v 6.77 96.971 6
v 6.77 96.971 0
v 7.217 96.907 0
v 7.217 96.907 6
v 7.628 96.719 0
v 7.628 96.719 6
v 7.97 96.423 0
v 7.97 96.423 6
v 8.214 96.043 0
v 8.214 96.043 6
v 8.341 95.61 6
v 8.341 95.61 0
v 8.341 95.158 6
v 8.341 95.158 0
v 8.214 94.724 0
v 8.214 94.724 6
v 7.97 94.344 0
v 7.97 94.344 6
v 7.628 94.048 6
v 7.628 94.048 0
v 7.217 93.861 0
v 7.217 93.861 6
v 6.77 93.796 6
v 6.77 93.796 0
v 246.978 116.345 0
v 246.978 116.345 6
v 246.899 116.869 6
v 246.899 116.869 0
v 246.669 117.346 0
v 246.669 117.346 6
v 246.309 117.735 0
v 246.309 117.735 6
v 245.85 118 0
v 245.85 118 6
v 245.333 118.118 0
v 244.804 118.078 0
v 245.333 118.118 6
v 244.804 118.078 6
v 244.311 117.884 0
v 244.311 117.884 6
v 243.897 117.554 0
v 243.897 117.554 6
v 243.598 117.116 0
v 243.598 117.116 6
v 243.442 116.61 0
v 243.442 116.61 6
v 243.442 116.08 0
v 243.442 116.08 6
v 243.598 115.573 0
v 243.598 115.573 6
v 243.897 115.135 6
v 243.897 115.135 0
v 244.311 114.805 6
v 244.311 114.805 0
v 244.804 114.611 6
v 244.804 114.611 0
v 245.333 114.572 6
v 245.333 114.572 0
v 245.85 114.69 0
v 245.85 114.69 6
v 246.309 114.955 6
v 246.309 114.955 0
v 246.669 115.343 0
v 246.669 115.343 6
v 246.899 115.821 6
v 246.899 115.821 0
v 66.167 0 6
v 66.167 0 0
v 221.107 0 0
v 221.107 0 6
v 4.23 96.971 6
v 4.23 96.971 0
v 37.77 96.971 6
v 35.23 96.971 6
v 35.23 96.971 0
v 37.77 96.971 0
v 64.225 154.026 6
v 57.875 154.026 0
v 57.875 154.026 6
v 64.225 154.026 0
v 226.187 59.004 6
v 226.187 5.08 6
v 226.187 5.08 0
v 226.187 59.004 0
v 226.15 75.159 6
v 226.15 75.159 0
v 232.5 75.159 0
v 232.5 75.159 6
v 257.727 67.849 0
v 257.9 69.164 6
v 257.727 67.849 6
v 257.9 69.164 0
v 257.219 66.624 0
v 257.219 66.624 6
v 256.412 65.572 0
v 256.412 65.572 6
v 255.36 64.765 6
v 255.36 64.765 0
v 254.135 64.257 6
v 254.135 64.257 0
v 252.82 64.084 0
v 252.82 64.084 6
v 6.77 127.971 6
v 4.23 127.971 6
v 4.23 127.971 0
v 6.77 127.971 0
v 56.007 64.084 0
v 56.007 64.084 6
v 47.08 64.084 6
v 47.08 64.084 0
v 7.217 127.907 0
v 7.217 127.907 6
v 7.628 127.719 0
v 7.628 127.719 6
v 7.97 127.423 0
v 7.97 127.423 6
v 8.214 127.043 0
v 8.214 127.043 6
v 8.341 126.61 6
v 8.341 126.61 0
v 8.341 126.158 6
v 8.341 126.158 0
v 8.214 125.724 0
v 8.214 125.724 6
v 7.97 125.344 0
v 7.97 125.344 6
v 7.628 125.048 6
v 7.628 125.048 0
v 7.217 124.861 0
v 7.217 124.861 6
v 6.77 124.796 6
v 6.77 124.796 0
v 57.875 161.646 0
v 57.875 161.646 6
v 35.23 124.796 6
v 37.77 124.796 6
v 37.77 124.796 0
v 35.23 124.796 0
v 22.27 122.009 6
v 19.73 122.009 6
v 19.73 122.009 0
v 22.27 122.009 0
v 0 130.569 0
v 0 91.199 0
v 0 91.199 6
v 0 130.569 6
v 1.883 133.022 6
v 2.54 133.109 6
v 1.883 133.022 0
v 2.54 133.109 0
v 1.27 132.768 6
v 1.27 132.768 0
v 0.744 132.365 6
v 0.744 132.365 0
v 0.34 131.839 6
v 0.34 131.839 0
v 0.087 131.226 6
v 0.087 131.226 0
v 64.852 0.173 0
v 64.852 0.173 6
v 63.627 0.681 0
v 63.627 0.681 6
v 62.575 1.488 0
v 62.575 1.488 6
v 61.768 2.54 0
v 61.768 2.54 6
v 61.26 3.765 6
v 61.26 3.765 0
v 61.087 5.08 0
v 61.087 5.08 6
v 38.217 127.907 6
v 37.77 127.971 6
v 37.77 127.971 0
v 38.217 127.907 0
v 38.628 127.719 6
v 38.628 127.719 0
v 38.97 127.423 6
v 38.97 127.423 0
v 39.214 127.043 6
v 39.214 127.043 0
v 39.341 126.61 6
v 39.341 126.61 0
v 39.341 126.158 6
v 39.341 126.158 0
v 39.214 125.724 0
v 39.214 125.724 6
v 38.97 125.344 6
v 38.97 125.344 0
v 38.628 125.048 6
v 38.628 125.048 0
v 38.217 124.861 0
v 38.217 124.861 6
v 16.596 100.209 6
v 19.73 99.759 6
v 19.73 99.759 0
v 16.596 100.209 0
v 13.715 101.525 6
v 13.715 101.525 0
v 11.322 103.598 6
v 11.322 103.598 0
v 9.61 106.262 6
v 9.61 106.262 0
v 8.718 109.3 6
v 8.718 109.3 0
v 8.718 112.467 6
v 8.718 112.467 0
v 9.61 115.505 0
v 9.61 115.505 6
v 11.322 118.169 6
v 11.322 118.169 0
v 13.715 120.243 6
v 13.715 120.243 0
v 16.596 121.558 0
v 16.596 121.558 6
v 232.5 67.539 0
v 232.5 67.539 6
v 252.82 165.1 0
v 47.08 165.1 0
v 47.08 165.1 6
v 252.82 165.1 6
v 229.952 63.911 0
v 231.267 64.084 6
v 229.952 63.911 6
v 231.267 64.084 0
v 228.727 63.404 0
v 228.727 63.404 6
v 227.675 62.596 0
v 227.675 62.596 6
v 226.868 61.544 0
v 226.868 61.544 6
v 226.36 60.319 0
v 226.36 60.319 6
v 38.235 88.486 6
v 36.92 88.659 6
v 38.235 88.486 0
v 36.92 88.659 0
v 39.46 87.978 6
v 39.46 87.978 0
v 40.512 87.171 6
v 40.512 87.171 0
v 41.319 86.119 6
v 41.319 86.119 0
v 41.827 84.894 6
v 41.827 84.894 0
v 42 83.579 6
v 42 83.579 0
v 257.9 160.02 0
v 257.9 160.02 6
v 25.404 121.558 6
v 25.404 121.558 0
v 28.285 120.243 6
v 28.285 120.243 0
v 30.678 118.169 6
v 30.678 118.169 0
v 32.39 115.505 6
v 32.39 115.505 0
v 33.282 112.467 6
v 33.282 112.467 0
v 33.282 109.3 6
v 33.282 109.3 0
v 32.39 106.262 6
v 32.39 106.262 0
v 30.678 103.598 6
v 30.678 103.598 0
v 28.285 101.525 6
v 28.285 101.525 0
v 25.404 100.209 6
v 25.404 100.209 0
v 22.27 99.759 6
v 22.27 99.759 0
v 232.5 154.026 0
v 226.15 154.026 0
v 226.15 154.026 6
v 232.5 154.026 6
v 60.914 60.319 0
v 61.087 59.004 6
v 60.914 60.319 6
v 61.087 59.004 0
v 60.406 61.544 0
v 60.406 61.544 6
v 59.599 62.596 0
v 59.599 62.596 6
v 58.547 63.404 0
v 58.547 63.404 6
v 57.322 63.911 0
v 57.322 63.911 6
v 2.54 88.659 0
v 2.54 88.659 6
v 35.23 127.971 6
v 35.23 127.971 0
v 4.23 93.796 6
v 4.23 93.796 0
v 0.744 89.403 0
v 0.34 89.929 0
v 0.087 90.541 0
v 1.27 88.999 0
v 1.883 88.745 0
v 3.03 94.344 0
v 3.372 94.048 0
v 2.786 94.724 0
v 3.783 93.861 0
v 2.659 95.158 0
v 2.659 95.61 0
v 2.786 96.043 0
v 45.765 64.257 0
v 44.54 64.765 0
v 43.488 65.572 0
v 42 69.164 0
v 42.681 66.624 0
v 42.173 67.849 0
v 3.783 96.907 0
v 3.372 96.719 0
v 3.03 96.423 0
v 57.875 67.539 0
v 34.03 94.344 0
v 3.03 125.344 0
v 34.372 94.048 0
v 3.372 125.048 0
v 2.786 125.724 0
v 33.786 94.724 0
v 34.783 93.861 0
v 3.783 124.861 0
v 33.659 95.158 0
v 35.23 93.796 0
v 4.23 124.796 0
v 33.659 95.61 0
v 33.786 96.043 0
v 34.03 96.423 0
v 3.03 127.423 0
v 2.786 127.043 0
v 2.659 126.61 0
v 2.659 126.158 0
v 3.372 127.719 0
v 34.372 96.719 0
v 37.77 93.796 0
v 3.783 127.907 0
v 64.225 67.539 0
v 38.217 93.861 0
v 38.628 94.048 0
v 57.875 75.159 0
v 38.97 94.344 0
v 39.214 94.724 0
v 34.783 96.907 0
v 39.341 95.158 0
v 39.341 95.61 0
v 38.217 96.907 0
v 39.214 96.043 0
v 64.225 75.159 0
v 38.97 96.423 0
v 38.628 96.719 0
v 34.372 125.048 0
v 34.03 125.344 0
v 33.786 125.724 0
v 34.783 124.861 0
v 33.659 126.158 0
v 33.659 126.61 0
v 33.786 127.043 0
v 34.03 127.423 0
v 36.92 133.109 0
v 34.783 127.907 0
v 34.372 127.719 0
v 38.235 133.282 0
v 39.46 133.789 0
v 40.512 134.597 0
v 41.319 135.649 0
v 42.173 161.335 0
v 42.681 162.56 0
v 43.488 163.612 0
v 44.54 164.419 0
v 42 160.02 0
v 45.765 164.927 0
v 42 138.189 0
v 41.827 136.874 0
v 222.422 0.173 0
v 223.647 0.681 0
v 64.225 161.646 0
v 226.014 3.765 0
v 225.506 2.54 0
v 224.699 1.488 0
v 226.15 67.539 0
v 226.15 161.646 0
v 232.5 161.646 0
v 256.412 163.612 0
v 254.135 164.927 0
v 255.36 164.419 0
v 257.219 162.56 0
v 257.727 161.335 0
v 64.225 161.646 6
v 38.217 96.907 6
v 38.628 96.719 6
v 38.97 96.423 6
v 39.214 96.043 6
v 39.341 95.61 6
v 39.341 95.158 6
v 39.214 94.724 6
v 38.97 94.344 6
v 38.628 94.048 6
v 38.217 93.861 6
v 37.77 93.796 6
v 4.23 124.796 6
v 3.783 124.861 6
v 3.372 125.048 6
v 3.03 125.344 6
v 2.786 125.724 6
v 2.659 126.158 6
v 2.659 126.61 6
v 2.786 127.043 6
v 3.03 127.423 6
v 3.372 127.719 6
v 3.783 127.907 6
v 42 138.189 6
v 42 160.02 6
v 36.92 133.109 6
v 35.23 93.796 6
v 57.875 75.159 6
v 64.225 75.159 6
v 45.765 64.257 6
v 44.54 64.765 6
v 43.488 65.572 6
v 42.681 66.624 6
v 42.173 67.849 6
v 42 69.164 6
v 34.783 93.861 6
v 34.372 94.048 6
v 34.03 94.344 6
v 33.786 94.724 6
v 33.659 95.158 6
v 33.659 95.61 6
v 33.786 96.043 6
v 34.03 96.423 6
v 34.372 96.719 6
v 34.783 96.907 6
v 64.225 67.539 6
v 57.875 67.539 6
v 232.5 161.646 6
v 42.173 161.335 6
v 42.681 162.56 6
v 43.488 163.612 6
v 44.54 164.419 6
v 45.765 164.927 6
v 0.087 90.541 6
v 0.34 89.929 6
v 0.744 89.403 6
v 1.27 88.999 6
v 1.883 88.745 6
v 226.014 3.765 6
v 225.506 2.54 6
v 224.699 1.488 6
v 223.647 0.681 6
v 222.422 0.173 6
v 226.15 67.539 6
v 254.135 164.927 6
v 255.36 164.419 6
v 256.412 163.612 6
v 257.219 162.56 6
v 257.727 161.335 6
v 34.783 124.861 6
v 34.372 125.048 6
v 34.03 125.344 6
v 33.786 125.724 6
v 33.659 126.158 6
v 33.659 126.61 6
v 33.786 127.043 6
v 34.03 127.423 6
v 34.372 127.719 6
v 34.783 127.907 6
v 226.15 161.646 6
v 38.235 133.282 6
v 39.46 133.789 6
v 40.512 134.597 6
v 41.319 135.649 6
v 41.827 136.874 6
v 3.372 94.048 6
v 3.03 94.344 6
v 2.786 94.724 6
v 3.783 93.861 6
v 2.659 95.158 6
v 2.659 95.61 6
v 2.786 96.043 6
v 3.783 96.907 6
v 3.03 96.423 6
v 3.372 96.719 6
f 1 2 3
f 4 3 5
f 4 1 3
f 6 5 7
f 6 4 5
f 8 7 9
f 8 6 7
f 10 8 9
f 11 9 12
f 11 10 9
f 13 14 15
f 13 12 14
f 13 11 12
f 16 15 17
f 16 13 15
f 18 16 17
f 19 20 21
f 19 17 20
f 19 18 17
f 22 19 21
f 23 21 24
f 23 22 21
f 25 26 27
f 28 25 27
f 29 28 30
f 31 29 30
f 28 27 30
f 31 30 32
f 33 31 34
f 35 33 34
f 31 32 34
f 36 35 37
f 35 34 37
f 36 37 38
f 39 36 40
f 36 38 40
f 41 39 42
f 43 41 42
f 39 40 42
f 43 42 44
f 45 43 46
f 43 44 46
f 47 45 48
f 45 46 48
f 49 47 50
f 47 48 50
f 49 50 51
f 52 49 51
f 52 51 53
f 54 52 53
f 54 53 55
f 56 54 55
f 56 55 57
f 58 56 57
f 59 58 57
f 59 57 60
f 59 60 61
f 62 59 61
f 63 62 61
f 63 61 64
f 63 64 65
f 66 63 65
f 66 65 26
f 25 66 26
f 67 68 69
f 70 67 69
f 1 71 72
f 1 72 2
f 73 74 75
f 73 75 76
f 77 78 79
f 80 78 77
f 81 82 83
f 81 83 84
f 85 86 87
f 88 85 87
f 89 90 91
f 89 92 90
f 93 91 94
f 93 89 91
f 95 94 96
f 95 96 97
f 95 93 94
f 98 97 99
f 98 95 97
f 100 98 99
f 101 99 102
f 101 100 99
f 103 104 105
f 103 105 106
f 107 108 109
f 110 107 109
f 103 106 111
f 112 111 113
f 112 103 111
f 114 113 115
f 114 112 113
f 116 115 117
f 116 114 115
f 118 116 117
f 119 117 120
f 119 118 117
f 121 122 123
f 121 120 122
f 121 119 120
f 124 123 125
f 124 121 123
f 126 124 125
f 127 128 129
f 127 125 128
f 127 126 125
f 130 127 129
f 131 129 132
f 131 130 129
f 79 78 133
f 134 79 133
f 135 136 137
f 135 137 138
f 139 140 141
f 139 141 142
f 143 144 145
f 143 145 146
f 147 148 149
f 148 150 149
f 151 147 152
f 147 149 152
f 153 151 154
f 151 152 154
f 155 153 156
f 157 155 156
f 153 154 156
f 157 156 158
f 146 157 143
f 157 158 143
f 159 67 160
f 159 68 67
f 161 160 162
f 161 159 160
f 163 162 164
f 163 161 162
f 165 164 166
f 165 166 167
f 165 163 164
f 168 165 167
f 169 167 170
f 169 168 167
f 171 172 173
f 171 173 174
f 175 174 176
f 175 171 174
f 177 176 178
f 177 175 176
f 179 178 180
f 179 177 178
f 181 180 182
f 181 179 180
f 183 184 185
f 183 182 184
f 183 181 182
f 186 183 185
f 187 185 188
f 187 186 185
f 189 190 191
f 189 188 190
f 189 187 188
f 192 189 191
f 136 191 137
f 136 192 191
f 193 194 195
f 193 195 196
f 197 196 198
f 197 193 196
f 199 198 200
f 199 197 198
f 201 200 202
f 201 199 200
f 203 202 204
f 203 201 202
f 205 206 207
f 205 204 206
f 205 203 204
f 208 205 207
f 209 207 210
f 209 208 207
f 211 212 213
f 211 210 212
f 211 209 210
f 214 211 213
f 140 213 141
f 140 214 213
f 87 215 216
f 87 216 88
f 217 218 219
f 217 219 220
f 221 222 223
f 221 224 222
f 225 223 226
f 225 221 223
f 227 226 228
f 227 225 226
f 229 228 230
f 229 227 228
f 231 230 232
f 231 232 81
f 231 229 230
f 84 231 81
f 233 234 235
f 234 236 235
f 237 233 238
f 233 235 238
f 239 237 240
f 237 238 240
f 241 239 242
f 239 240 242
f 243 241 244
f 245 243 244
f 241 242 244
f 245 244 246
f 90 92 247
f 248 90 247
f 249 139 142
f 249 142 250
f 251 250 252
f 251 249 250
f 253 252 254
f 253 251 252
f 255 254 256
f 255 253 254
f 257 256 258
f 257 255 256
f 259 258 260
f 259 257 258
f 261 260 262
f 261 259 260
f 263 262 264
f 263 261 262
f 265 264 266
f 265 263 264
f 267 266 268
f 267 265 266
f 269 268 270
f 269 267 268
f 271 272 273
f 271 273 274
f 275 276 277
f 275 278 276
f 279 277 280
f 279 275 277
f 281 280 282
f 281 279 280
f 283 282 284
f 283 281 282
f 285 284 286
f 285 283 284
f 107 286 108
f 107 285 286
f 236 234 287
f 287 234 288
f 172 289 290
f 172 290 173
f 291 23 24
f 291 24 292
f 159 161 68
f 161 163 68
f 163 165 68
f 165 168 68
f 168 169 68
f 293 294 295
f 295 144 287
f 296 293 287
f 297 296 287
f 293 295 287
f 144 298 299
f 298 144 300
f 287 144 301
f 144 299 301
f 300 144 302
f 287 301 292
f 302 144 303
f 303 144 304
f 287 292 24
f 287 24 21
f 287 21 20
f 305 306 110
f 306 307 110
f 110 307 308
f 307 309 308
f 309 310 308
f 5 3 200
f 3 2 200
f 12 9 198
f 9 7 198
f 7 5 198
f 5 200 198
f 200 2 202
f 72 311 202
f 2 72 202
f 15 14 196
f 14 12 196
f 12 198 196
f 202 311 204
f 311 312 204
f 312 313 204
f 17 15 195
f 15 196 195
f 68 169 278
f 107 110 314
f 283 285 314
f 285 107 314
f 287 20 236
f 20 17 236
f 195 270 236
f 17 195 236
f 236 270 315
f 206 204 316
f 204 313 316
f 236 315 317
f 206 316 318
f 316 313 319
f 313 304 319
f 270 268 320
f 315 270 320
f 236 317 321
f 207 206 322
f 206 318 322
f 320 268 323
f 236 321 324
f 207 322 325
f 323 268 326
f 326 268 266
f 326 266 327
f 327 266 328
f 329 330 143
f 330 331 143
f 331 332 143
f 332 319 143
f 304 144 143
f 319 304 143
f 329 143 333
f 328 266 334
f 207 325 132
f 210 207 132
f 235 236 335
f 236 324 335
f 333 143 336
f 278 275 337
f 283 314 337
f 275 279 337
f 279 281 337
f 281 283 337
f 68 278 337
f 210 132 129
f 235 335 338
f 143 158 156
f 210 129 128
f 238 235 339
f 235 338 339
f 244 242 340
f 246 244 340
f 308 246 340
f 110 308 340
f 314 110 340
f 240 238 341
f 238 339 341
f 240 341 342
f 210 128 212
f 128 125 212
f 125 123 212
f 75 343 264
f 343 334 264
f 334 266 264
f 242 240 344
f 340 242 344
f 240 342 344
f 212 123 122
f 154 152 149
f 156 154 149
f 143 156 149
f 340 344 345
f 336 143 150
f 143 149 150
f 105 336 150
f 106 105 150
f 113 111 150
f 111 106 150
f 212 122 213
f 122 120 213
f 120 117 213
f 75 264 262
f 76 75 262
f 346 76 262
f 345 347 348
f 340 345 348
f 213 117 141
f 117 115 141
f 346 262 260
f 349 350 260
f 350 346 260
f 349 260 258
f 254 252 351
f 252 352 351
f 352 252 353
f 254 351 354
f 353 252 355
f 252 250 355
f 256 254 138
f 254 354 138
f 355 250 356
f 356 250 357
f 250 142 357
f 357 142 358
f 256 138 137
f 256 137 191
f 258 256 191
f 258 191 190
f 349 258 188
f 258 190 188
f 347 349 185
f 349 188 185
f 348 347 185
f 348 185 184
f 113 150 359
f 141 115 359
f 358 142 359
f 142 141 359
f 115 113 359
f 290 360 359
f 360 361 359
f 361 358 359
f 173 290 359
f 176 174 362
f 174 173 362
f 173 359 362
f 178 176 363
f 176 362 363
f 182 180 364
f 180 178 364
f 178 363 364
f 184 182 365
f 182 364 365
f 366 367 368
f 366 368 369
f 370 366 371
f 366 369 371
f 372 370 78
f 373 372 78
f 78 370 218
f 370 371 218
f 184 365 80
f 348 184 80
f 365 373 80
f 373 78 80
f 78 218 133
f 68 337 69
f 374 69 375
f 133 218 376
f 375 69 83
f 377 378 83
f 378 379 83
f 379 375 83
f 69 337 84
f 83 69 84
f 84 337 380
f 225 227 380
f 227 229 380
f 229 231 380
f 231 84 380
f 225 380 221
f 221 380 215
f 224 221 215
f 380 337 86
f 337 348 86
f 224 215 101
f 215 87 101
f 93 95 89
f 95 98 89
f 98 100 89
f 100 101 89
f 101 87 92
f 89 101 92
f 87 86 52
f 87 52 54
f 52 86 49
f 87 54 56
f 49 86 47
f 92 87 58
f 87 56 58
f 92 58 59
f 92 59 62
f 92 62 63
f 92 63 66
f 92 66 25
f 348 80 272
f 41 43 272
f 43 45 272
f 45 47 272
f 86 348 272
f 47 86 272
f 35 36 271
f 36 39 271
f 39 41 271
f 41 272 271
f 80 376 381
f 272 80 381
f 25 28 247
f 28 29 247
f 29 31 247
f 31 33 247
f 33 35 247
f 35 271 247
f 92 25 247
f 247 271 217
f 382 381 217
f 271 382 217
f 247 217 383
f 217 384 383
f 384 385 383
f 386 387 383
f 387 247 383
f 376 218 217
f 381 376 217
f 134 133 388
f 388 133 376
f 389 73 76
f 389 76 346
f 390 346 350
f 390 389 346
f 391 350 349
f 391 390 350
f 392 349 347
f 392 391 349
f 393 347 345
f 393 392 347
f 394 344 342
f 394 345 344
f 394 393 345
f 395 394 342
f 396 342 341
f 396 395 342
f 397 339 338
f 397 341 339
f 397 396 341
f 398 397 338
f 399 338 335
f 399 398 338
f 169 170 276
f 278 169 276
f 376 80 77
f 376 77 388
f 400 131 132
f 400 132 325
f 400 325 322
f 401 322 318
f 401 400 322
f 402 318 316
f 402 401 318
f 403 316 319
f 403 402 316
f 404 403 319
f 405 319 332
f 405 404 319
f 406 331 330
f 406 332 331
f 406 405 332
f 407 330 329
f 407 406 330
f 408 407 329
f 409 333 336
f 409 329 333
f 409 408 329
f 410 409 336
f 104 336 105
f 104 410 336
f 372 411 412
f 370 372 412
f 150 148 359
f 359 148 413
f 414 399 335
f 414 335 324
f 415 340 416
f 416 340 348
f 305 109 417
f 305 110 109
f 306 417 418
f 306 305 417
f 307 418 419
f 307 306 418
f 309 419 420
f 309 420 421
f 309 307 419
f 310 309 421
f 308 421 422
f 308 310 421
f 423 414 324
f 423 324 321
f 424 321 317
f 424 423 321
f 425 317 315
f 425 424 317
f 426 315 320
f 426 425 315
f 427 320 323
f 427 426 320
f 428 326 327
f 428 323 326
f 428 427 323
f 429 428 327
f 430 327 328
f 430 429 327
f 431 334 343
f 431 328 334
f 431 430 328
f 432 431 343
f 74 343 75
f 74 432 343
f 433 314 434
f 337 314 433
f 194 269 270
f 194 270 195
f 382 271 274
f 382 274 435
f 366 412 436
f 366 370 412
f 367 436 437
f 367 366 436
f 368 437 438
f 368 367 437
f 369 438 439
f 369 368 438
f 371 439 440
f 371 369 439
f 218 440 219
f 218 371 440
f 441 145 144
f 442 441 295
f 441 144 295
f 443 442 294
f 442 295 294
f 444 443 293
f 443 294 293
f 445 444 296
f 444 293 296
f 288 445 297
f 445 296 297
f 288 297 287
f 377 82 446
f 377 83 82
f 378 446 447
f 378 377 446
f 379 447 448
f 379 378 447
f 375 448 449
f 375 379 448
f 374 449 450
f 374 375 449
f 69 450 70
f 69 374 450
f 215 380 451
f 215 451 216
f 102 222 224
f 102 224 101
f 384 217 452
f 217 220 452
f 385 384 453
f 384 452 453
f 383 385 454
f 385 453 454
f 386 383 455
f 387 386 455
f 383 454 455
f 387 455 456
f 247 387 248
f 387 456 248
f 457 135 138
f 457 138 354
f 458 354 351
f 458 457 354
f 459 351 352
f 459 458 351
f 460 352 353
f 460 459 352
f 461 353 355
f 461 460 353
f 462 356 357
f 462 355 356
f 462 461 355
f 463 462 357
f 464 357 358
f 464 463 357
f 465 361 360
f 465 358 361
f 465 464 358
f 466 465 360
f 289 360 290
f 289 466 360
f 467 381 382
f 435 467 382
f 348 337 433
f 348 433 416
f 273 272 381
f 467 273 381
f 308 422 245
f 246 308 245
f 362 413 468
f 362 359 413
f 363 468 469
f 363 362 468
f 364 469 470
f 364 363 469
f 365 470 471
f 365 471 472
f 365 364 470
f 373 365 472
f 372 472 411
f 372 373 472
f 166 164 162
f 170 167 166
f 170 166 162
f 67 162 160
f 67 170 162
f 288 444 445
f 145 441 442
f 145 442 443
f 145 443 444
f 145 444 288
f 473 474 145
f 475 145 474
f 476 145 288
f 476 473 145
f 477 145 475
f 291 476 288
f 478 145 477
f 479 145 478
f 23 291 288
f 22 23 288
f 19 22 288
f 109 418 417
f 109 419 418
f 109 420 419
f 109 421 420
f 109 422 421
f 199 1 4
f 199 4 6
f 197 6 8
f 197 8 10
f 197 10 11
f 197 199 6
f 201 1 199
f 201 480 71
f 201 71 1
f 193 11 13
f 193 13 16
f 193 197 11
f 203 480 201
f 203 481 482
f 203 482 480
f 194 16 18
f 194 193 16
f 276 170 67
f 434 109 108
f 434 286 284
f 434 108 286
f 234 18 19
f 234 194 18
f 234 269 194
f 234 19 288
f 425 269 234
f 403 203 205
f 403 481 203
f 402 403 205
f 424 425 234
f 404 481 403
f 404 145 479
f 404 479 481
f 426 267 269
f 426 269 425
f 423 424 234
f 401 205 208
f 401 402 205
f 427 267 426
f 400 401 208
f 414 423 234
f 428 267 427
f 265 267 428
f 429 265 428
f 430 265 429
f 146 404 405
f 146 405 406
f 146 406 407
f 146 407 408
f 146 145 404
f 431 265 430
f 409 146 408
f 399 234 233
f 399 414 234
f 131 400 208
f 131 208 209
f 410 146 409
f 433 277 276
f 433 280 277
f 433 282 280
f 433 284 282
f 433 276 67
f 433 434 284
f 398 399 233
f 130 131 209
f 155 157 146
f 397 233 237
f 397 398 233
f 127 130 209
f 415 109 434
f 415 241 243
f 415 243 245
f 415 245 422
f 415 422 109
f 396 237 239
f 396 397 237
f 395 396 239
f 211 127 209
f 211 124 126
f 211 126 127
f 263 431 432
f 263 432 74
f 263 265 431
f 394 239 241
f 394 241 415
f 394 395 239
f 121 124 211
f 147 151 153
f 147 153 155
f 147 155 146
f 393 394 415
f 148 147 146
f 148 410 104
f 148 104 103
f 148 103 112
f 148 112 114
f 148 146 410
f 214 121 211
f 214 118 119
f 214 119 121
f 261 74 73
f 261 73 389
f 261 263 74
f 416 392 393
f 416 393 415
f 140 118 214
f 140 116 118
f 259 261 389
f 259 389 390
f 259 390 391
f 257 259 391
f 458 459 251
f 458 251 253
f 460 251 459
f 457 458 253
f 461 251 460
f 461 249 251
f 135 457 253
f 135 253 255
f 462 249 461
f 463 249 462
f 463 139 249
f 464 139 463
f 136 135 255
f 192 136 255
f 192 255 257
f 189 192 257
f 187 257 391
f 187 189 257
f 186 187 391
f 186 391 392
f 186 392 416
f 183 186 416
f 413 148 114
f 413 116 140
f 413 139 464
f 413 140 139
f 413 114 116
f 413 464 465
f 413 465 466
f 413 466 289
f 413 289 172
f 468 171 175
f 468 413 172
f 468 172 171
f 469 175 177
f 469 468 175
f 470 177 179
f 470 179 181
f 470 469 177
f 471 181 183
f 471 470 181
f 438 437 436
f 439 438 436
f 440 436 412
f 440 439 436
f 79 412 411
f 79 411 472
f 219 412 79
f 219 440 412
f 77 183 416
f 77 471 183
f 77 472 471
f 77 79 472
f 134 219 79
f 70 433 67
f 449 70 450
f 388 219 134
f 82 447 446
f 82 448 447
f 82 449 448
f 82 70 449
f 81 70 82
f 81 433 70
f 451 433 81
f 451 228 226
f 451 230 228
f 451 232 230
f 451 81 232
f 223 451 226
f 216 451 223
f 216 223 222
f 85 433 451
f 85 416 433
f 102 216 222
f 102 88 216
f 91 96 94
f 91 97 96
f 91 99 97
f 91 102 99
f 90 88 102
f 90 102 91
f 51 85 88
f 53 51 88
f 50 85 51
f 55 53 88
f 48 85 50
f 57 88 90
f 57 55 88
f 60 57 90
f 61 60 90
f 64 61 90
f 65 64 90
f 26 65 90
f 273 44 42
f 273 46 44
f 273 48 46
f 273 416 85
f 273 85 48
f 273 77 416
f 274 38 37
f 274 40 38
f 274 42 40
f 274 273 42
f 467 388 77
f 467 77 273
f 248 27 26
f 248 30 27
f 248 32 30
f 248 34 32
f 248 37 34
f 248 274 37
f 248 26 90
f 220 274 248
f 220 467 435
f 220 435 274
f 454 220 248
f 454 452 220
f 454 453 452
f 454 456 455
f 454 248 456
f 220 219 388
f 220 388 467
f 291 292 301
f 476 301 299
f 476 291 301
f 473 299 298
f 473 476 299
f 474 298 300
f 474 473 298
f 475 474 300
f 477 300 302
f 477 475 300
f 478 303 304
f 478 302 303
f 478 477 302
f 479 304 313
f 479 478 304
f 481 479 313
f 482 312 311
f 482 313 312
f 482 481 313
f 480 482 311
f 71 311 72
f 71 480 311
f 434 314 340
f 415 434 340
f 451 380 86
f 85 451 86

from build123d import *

# Parameters (mm, degrees)
SKETCH1_W           = 257.9
SKETCH1_H           = 165.1
SKETCH1_W_2         = 6.35
SKETCH1_H_2         = 7.62
BOSS_EXTRUDE1_DEPTH = 6
SKETCH2_R           = 1.778
CUT_EXTRUDE1_DEPTH  = 307.278337464
SKETCH3_W           = 42
SKETCH3_H           = 31.9913
SKETCH3_W_2         = 31.713
SKETCH3_H_2         = 64.0842
CUT_EXTRUDE2_DEPTH  = 307.278337464
FILLET1_R           = 5.08
FILLET2_R           = 2.54


with BuildPart() as part:
    # Sketch1 → Boss-Extrude1 (new body)
    with BuildSketch(Plane.XY):
        with Locations((128.95, 82.55)):
            Rectangle(SKETCH1_W, SKETCH1_H)
        with Locations((229.325, 157.8356)):
            Rectangle(SKETCH1_W_2, SKETCH1_H_2, mode=Mode.SUBTRACT)
        with Locations((61.05, 157.8356)):
            Rectangle(SKETCH1_W_2, SKETCH1_H_2, mode=Mode.SUBTRACT)
        with Locations((229.325, 71.3486)):
            Rectangle(SKETCH1_W_2, SKETCH1_H_2, mode=Mode.SUBTRACT)
        with Locations((61.05, 71.3486)):
            Rectangle(SKETCH1_W_2, SKETCH1_H_2, mode=Mode.SUBTRACT)
    extrude(amount=BOSS_EXTRUDE1_DEPTH)

    # Sketch2 → Cut-Extrude1 (cut, through all)
    with BuildSketch(Plane.XY.offset(6)):
        with Locations((245.2, 116.3447)):
            Circle(SKETCH2_R)
        with BuildLine():
            Line((4.23, 127.9712), (6.77, 127.9712))
            ThreePointArc((6.77, 127.9712), (8.3575, 126.3837), (6.77, 124.7962))
            Line((6.77, 124.7962), (4.23, 124.7962))
            ThreePointArc((4.23, 124.7962), (2.6425, 126.3837), (4.23, 127.9712))
        make_face()
        with BuildLine():
            Line((35.23, 127.9712), (37.77, 127.9712))
            ThreePointArc((37.77, 127.9712), (39.3575, 126.3837), (37.77, 124.7962))
            Line((37.77, 124.7962), (35.23, 124.7962))
            ThreePointArc((35.23, 124.7962), (33.6425, 126.3837), (35.23, 127.9712))
        make_face()
        with BuildLine():
            Line((35.23, 96.9712), (37.77, 96.9712))
            ThreePointArc((37.77, 96.9712), (39.3575, 95.3837), (37.77, 93.7962))
            Line((37.77, 93.7962), (35.23, 93.7962))
            ThreePointArc((35.23, 93.7962), (33.6425, 95.3837), (35.23, 96.9712))
        make_face()
        with BuildLine():
            Line((4.23, 96.9712), (6.77, 96.9712))
            ThreePointArc((6.77, 96.9712), (8.3575, 95.3837), (6.77, 93.7962))
            Line((6.77, 93.7962), (4.23, 93.7962))
            ThreePointArc((4.23, 93.7962), (2.6425, 95.3837), (4.23, 96.9712))
        make_face()
        with BuildLine():
            Line((19.73, 122.0087), (22.27, 122.0087))
            ThreePointArc((22.27, 122.0087), (33.395, 110.8837), (22.27, 99.7587))
            Line((22.27, 99.7587), (19.73, 99.7587))
            ThreePointArc((19.73, 99.7587), (8.605, 110.8837), (19.73, 122.0087))
        make_face()
    extrude(amount=-CUT_EXTRUDE1_DEPTH, mode=Mode.SUBTRACT)

    # Sketch3 → Cut-Extrude2 (cut, through all)
    with BuildSketch(Plane.XY.offset(6)):
        Polygon((61.087, 0), (61.087, 64.0842), (42, 64.0842), (42, 88.6587), (0, 88.6587), (0, 0), align=None)
        with Locations((21, 149.10435)):
            Rectangle(SKETCH3_W, SKETCH3_H)
        with Locations((242.0435, 32.0421)):
            Rectangle(SKETCH3_W_2, SKETCH3_H_2)
    extrude(amount=-CUT_EXTRUDE2_DEPTH, mode=Mode.SUBTRACT)

    # Fillet1
    fillet1_edges = [part.edges().sort_by_distance(p)[0] for p in [
        (61.087, 0, 3),
        (42, 88.6587, 3),
        (42, 64.0842, 3),
        (61.087, 64.0842, 3),
        (42, 165.1, 3),
        (42, 133.1087, 3),
        (226.187, 0, 3),
        (226.187, 64.0842, 3),
        (257.9, 64.0842, 3),
        (257.9, 165.1, 3),
    ]]
    fillet(fillet1_edges, radius=FILLET1_R)

    # Fillet2
    fillet2_edges = [part.edges().sort_by_distance(p)[0] for p in [
        (0, 88.6587, 3),
        (0, 133.1087, 3),
    ]]
    fillet(fillet2_edges, radius=FILLET2_R)


solid = part.part
